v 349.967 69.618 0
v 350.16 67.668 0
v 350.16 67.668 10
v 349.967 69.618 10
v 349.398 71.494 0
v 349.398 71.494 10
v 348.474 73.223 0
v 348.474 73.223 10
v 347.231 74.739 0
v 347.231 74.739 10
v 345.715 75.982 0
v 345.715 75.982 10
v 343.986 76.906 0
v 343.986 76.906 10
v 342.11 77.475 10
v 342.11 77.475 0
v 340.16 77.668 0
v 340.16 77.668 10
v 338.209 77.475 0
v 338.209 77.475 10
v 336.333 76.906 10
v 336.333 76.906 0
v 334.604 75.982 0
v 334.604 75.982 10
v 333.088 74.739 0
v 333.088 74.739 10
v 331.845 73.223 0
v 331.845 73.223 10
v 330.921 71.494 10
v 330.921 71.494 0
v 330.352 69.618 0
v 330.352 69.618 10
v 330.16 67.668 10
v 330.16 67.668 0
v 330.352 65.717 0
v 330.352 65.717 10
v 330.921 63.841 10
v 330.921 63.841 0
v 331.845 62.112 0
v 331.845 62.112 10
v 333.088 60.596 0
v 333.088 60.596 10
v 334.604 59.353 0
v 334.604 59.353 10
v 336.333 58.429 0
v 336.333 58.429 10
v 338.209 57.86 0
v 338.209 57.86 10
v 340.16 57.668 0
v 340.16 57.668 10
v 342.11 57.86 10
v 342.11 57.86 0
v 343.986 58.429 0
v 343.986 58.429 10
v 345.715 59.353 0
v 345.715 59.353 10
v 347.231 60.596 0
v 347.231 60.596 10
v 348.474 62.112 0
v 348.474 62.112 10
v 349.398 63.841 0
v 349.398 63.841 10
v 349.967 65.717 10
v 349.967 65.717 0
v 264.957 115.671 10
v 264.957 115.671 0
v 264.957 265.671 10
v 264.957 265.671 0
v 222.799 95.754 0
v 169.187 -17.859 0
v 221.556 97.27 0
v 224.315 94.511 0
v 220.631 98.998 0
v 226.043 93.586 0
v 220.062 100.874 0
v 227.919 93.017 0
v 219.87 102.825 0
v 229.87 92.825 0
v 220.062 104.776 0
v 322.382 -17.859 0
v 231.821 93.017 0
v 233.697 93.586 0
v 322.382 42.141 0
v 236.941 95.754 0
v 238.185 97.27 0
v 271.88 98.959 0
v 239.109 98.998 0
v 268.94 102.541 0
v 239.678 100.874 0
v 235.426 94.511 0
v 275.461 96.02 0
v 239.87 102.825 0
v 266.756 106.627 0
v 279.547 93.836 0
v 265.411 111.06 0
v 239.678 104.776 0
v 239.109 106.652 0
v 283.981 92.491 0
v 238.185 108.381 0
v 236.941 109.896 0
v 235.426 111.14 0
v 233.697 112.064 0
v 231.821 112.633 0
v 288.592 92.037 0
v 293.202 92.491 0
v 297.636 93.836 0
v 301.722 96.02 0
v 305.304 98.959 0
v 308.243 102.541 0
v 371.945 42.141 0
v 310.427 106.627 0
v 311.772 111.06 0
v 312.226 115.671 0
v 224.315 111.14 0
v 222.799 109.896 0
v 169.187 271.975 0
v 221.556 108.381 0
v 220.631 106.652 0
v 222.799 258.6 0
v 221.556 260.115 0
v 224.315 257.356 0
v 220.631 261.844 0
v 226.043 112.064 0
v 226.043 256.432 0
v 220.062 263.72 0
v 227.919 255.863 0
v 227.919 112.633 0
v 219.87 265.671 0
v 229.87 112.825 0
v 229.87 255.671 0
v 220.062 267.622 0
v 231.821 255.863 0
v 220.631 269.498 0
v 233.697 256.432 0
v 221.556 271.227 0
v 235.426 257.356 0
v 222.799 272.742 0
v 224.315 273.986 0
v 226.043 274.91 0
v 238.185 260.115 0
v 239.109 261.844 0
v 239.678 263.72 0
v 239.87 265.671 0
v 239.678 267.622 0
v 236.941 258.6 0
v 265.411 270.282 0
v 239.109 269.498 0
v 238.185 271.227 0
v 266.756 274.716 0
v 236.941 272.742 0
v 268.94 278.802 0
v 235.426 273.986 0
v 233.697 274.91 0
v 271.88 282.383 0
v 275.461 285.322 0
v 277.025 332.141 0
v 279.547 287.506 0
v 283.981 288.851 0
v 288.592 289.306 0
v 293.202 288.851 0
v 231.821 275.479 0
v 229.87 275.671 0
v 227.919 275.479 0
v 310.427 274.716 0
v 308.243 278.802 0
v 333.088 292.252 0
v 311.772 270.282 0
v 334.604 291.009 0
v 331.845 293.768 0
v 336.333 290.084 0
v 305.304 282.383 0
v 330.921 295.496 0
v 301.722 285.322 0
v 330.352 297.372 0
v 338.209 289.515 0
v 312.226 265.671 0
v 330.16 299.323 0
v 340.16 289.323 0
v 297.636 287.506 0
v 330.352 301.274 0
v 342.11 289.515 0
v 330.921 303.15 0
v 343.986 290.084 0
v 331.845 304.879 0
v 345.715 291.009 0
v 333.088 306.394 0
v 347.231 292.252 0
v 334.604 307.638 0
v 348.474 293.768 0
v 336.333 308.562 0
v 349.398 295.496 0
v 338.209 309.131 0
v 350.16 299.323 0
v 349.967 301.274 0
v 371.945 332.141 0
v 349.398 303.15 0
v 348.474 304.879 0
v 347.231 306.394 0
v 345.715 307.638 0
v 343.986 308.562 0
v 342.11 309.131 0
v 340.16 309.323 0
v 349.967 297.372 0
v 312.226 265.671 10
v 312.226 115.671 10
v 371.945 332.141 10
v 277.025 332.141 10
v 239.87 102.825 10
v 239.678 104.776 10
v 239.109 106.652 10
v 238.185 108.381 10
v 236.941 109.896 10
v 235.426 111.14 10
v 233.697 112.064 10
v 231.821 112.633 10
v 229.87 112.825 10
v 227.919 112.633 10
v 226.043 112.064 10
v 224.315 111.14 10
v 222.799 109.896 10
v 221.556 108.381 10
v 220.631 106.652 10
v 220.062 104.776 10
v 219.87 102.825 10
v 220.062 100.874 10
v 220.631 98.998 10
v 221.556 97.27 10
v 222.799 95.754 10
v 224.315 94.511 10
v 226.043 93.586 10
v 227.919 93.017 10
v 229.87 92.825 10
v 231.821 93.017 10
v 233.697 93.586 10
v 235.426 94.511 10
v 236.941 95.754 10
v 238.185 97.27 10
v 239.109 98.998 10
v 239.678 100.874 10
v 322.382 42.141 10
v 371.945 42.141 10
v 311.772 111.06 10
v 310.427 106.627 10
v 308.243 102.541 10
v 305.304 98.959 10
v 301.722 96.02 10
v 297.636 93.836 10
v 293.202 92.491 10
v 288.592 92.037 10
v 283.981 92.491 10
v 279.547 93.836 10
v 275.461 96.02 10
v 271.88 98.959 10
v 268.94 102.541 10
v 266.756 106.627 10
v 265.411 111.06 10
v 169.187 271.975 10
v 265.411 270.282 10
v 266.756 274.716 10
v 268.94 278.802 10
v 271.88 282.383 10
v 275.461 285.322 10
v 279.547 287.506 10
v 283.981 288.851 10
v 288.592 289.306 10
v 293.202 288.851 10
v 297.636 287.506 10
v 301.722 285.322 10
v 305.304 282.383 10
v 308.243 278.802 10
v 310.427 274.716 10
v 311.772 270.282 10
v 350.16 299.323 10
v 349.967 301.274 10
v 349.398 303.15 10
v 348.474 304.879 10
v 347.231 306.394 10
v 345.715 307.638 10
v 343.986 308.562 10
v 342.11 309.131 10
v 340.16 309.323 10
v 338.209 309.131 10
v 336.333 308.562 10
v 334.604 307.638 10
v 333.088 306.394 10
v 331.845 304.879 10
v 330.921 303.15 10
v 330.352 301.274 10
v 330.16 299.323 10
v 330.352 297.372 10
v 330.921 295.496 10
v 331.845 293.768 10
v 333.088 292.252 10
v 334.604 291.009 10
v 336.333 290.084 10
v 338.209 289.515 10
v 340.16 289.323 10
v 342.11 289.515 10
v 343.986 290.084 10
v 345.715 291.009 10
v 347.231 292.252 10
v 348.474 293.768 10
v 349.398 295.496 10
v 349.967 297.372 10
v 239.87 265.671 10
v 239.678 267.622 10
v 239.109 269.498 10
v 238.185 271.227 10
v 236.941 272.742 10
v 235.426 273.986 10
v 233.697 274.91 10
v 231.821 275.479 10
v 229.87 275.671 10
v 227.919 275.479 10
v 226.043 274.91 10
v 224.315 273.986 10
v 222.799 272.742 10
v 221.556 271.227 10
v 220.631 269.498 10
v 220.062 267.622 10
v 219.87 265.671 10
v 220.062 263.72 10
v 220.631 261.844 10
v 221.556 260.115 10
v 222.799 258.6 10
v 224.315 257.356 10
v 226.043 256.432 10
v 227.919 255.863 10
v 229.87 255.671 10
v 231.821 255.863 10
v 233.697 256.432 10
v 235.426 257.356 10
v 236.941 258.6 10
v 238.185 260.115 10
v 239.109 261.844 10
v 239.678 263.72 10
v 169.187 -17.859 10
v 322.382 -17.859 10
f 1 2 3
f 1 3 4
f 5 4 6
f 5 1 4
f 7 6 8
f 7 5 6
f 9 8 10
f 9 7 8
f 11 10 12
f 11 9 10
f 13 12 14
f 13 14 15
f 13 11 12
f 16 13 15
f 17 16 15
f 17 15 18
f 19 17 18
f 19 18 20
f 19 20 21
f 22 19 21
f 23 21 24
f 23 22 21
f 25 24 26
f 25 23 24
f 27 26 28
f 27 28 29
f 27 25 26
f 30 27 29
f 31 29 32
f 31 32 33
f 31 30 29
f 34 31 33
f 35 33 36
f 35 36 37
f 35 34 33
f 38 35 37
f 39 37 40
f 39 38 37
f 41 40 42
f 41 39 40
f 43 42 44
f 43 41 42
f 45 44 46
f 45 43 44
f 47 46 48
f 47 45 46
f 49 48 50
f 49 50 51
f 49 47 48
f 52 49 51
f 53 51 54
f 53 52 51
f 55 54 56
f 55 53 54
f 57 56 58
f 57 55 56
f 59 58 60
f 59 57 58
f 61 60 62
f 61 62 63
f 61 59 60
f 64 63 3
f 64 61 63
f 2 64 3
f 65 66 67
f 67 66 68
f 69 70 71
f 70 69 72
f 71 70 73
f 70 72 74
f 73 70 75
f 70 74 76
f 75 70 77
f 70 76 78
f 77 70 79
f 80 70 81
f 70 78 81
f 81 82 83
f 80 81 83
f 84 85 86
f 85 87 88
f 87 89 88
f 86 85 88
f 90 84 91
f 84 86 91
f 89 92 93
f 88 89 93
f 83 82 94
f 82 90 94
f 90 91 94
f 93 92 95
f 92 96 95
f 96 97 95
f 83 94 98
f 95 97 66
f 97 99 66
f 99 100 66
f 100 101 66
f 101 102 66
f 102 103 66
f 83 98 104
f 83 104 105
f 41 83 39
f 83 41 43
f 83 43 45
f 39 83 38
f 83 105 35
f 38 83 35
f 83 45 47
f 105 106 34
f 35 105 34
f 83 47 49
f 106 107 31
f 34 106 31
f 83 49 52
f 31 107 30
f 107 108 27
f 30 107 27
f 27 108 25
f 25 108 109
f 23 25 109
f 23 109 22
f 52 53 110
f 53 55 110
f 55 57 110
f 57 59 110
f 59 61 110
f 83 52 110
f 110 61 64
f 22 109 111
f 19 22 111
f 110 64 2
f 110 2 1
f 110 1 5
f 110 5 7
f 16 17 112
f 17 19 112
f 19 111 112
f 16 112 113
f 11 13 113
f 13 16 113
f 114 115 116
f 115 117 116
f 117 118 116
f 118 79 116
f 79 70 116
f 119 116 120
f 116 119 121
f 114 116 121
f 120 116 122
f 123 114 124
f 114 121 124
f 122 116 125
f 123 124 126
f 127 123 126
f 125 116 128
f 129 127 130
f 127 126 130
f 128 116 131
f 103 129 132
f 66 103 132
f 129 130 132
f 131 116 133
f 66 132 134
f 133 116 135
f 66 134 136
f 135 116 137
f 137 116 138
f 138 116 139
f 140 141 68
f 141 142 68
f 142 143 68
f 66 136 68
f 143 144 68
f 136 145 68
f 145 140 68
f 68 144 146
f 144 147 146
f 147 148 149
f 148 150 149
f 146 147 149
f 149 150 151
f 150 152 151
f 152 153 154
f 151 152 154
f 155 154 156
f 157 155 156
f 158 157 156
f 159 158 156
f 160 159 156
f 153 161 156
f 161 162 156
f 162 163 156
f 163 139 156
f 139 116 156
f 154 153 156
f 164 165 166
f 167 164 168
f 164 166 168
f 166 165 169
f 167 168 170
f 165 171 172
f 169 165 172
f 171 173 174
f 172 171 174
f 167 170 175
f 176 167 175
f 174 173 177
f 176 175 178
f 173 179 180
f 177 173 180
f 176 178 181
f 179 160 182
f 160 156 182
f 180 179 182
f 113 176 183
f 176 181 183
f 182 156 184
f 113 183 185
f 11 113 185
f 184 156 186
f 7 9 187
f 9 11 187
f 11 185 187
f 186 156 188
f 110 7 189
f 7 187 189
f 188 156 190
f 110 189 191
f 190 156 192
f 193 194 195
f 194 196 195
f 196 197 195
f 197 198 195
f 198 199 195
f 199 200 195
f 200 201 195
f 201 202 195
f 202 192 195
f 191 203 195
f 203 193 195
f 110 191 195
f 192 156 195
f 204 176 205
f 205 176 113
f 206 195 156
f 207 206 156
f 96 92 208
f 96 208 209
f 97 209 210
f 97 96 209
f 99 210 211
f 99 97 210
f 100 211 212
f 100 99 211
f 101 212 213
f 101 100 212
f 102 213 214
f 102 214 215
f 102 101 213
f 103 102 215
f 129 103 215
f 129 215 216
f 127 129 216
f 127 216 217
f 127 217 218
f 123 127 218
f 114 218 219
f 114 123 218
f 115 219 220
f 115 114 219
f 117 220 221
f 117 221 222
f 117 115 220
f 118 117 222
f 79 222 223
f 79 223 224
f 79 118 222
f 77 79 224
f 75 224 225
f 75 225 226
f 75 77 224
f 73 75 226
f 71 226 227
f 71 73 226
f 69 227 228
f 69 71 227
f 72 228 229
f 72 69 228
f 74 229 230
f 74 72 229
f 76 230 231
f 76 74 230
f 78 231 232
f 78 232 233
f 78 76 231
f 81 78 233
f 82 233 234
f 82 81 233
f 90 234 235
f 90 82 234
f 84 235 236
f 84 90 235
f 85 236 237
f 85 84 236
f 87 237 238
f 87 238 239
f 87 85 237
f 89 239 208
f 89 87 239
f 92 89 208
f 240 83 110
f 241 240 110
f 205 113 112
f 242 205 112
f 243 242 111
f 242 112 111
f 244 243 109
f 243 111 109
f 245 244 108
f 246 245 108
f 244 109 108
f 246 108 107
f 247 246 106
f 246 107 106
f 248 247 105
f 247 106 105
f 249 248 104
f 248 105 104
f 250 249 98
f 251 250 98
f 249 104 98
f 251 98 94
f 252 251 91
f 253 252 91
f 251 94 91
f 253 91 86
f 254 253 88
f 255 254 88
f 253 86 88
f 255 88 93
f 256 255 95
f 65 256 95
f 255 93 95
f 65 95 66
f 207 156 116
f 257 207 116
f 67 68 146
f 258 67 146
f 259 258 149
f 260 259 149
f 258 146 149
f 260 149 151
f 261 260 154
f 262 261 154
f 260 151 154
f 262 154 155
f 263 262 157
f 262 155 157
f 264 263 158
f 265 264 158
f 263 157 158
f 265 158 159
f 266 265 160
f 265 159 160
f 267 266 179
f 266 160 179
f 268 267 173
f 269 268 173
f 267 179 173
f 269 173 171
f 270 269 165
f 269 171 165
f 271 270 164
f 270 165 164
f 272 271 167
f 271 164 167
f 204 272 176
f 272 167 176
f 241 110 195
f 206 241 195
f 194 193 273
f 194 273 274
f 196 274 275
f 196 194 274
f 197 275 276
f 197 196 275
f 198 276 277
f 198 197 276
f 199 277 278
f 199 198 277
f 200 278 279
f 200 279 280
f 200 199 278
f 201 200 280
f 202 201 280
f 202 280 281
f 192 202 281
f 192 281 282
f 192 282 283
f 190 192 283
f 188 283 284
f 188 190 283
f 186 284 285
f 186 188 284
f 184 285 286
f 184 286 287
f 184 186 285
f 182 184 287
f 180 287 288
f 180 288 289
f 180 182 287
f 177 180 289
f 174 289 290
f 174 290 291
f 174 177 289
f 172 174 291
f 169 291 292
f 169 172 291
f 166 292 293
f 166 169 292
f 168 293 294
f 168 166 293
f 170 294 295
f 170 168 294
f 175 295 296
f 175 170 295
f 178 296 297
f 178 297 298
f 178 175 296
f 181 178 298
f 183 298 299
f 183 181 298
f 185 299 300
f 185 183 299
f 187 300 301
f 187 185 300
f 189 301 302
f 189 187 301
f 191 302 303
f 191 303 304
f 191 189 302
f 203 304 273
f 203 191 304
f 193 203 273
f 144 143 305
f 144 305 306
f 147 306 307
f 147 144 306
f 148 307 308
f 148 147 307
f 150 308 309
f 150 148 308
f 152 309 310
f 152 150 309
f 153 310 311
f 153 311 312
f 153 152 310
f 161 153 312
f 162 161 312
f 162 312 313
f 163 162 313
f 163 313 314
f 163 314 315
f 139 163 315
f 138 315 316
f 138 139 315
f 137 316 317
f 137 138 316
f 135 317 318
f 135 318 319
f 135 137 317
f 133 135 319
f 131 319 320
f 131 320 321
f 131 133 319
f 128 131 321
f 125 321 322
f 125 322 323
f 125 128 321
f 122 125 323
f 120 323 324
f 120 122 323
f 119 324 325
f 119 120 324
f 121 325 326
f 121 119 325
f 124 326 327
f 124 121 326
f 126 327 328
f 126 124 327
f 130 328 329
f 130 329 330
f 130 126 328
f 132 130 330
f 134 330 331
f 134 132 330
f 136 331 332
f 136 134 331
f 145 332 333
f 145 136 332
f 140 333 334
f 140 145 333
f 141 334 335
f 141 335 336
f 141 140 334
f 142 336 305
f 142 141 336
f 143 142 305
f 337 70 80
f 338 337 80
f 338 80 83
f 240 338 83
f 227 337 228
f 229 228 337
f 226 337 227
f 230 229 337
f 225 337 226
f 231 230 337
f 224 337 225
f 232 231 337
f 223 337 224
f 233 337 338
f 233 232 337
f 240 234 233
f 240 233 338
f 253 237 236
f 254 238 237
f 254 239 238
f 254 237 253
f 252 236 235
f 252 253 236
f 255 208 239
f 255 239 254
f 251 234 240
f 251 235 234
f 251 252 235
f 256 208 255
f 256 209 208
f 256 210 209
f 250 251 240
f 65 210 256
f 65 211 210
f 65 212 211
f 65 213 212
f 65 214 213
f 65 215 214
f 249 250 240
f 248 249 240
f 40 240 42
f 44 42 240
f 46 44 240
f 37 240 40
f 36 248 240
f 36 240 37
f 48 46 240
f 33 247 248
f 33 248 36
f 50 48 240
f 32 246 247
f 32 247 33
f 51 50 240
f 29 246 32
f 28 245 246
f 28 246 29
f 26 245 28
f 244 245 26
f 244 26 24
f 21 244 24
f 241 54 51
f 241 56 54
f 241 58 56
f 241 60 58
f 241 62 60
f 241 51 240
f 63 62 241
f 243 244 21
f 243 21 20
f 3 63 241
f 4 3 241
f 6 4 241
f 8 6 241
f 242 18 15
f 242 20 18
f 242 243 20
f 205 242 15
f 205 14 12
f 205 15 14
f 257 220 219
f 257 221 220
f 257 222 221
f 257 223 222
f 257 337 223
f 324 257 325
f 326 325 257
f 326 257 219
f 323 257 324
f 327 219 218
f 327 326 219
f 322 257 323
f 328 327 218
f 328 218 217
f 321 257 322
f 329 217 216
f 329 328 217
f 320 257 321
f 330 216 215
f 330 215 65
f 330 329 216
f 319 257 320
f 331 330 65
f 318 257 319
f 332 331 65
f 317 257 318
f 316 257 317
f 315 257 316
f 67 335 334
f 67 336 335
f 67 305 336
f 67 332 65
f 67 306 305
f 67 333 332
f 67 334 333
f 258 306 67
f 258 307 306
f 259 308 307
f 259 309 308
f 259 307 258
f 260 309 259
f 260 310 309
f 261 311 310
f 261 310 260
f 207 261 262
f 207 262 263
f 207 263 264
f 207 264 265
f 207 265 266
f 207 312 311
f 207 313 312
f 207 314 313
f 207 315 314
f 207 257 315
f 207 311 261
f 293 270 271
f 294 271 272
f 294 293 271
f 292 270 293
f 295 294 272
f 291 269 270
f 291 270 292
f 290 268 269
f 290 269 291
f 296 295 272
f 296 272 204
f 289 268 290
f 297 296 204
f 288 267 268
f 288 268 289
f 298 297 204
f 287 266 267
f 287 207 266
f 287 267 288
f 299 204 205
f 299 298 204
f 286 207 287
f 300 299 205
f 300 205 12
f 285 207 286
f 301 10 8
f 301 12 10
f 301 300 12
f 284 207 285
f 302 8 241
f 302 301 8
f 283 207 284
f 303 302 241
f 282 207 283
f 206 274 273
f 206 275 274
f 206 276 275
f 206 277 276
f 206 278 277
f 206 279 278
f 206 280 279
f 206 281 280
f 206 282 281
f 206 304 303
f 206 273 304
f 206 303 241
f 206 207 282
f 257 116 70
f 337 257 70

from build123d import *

# Parameters (mm, degrees)
SKETCH1_R           = 10
BOSS_EXTRUDE1_DEPTH = 10


with BuildPart() as part:
    # Sketch1 → Boss-Extrude1 (new body)
    with BuildSketch(Plane.XY):
        Polygon((322.382476836, -17.859318996), (322.382476836, 42.140681004), (371.94488009, 42.140681004), (371.94488009, 332.140681004), (277.025034275, 332.140681004), (169.187054595, 271.975052979), (169.187054595, 205.170044114), (169.187054595, -17.859318996), align=None)
        with Locations((229.870255563, 265.671146953)):
            Circle(SKETCH1_R, mode=Mode.SUBTRACT)
        with Locations((229.870255563, 102.825256229)):
            Circle(SKETCH1_R, mode=Mode.SUBTRACT)
        with Locations((340.159565259, 299.323240315)):
            Circle(SKETCH1_R, mode=Mode.SUBTRACT)
        with Locations((340.159565259, 67.667528684)):
            Circle(SKETCH1_R, mode=Mode.SUBTRACT)
        with BuildLine():
            Line((312.226028305, 265.671146953), (312.226028305, 115.671146953))
            ThreePointArc((312.226028305, 115.671146953), (288.591642629, 92.036761277), (264.957256952, 115.671146953))
            Line((264.957256952, 115.671146953), (264.957256952, 265.671146953))
            ThreePointArc((264.957256952, 265.671146953), (288.591642629, 289.30553263), (312.226028305, 265.671146953))
        make_face(mode=Mode.SUBTRACT)
    extrude(amount=BOSS_EXTRUDE1_DEPTH)


solid = part.part
